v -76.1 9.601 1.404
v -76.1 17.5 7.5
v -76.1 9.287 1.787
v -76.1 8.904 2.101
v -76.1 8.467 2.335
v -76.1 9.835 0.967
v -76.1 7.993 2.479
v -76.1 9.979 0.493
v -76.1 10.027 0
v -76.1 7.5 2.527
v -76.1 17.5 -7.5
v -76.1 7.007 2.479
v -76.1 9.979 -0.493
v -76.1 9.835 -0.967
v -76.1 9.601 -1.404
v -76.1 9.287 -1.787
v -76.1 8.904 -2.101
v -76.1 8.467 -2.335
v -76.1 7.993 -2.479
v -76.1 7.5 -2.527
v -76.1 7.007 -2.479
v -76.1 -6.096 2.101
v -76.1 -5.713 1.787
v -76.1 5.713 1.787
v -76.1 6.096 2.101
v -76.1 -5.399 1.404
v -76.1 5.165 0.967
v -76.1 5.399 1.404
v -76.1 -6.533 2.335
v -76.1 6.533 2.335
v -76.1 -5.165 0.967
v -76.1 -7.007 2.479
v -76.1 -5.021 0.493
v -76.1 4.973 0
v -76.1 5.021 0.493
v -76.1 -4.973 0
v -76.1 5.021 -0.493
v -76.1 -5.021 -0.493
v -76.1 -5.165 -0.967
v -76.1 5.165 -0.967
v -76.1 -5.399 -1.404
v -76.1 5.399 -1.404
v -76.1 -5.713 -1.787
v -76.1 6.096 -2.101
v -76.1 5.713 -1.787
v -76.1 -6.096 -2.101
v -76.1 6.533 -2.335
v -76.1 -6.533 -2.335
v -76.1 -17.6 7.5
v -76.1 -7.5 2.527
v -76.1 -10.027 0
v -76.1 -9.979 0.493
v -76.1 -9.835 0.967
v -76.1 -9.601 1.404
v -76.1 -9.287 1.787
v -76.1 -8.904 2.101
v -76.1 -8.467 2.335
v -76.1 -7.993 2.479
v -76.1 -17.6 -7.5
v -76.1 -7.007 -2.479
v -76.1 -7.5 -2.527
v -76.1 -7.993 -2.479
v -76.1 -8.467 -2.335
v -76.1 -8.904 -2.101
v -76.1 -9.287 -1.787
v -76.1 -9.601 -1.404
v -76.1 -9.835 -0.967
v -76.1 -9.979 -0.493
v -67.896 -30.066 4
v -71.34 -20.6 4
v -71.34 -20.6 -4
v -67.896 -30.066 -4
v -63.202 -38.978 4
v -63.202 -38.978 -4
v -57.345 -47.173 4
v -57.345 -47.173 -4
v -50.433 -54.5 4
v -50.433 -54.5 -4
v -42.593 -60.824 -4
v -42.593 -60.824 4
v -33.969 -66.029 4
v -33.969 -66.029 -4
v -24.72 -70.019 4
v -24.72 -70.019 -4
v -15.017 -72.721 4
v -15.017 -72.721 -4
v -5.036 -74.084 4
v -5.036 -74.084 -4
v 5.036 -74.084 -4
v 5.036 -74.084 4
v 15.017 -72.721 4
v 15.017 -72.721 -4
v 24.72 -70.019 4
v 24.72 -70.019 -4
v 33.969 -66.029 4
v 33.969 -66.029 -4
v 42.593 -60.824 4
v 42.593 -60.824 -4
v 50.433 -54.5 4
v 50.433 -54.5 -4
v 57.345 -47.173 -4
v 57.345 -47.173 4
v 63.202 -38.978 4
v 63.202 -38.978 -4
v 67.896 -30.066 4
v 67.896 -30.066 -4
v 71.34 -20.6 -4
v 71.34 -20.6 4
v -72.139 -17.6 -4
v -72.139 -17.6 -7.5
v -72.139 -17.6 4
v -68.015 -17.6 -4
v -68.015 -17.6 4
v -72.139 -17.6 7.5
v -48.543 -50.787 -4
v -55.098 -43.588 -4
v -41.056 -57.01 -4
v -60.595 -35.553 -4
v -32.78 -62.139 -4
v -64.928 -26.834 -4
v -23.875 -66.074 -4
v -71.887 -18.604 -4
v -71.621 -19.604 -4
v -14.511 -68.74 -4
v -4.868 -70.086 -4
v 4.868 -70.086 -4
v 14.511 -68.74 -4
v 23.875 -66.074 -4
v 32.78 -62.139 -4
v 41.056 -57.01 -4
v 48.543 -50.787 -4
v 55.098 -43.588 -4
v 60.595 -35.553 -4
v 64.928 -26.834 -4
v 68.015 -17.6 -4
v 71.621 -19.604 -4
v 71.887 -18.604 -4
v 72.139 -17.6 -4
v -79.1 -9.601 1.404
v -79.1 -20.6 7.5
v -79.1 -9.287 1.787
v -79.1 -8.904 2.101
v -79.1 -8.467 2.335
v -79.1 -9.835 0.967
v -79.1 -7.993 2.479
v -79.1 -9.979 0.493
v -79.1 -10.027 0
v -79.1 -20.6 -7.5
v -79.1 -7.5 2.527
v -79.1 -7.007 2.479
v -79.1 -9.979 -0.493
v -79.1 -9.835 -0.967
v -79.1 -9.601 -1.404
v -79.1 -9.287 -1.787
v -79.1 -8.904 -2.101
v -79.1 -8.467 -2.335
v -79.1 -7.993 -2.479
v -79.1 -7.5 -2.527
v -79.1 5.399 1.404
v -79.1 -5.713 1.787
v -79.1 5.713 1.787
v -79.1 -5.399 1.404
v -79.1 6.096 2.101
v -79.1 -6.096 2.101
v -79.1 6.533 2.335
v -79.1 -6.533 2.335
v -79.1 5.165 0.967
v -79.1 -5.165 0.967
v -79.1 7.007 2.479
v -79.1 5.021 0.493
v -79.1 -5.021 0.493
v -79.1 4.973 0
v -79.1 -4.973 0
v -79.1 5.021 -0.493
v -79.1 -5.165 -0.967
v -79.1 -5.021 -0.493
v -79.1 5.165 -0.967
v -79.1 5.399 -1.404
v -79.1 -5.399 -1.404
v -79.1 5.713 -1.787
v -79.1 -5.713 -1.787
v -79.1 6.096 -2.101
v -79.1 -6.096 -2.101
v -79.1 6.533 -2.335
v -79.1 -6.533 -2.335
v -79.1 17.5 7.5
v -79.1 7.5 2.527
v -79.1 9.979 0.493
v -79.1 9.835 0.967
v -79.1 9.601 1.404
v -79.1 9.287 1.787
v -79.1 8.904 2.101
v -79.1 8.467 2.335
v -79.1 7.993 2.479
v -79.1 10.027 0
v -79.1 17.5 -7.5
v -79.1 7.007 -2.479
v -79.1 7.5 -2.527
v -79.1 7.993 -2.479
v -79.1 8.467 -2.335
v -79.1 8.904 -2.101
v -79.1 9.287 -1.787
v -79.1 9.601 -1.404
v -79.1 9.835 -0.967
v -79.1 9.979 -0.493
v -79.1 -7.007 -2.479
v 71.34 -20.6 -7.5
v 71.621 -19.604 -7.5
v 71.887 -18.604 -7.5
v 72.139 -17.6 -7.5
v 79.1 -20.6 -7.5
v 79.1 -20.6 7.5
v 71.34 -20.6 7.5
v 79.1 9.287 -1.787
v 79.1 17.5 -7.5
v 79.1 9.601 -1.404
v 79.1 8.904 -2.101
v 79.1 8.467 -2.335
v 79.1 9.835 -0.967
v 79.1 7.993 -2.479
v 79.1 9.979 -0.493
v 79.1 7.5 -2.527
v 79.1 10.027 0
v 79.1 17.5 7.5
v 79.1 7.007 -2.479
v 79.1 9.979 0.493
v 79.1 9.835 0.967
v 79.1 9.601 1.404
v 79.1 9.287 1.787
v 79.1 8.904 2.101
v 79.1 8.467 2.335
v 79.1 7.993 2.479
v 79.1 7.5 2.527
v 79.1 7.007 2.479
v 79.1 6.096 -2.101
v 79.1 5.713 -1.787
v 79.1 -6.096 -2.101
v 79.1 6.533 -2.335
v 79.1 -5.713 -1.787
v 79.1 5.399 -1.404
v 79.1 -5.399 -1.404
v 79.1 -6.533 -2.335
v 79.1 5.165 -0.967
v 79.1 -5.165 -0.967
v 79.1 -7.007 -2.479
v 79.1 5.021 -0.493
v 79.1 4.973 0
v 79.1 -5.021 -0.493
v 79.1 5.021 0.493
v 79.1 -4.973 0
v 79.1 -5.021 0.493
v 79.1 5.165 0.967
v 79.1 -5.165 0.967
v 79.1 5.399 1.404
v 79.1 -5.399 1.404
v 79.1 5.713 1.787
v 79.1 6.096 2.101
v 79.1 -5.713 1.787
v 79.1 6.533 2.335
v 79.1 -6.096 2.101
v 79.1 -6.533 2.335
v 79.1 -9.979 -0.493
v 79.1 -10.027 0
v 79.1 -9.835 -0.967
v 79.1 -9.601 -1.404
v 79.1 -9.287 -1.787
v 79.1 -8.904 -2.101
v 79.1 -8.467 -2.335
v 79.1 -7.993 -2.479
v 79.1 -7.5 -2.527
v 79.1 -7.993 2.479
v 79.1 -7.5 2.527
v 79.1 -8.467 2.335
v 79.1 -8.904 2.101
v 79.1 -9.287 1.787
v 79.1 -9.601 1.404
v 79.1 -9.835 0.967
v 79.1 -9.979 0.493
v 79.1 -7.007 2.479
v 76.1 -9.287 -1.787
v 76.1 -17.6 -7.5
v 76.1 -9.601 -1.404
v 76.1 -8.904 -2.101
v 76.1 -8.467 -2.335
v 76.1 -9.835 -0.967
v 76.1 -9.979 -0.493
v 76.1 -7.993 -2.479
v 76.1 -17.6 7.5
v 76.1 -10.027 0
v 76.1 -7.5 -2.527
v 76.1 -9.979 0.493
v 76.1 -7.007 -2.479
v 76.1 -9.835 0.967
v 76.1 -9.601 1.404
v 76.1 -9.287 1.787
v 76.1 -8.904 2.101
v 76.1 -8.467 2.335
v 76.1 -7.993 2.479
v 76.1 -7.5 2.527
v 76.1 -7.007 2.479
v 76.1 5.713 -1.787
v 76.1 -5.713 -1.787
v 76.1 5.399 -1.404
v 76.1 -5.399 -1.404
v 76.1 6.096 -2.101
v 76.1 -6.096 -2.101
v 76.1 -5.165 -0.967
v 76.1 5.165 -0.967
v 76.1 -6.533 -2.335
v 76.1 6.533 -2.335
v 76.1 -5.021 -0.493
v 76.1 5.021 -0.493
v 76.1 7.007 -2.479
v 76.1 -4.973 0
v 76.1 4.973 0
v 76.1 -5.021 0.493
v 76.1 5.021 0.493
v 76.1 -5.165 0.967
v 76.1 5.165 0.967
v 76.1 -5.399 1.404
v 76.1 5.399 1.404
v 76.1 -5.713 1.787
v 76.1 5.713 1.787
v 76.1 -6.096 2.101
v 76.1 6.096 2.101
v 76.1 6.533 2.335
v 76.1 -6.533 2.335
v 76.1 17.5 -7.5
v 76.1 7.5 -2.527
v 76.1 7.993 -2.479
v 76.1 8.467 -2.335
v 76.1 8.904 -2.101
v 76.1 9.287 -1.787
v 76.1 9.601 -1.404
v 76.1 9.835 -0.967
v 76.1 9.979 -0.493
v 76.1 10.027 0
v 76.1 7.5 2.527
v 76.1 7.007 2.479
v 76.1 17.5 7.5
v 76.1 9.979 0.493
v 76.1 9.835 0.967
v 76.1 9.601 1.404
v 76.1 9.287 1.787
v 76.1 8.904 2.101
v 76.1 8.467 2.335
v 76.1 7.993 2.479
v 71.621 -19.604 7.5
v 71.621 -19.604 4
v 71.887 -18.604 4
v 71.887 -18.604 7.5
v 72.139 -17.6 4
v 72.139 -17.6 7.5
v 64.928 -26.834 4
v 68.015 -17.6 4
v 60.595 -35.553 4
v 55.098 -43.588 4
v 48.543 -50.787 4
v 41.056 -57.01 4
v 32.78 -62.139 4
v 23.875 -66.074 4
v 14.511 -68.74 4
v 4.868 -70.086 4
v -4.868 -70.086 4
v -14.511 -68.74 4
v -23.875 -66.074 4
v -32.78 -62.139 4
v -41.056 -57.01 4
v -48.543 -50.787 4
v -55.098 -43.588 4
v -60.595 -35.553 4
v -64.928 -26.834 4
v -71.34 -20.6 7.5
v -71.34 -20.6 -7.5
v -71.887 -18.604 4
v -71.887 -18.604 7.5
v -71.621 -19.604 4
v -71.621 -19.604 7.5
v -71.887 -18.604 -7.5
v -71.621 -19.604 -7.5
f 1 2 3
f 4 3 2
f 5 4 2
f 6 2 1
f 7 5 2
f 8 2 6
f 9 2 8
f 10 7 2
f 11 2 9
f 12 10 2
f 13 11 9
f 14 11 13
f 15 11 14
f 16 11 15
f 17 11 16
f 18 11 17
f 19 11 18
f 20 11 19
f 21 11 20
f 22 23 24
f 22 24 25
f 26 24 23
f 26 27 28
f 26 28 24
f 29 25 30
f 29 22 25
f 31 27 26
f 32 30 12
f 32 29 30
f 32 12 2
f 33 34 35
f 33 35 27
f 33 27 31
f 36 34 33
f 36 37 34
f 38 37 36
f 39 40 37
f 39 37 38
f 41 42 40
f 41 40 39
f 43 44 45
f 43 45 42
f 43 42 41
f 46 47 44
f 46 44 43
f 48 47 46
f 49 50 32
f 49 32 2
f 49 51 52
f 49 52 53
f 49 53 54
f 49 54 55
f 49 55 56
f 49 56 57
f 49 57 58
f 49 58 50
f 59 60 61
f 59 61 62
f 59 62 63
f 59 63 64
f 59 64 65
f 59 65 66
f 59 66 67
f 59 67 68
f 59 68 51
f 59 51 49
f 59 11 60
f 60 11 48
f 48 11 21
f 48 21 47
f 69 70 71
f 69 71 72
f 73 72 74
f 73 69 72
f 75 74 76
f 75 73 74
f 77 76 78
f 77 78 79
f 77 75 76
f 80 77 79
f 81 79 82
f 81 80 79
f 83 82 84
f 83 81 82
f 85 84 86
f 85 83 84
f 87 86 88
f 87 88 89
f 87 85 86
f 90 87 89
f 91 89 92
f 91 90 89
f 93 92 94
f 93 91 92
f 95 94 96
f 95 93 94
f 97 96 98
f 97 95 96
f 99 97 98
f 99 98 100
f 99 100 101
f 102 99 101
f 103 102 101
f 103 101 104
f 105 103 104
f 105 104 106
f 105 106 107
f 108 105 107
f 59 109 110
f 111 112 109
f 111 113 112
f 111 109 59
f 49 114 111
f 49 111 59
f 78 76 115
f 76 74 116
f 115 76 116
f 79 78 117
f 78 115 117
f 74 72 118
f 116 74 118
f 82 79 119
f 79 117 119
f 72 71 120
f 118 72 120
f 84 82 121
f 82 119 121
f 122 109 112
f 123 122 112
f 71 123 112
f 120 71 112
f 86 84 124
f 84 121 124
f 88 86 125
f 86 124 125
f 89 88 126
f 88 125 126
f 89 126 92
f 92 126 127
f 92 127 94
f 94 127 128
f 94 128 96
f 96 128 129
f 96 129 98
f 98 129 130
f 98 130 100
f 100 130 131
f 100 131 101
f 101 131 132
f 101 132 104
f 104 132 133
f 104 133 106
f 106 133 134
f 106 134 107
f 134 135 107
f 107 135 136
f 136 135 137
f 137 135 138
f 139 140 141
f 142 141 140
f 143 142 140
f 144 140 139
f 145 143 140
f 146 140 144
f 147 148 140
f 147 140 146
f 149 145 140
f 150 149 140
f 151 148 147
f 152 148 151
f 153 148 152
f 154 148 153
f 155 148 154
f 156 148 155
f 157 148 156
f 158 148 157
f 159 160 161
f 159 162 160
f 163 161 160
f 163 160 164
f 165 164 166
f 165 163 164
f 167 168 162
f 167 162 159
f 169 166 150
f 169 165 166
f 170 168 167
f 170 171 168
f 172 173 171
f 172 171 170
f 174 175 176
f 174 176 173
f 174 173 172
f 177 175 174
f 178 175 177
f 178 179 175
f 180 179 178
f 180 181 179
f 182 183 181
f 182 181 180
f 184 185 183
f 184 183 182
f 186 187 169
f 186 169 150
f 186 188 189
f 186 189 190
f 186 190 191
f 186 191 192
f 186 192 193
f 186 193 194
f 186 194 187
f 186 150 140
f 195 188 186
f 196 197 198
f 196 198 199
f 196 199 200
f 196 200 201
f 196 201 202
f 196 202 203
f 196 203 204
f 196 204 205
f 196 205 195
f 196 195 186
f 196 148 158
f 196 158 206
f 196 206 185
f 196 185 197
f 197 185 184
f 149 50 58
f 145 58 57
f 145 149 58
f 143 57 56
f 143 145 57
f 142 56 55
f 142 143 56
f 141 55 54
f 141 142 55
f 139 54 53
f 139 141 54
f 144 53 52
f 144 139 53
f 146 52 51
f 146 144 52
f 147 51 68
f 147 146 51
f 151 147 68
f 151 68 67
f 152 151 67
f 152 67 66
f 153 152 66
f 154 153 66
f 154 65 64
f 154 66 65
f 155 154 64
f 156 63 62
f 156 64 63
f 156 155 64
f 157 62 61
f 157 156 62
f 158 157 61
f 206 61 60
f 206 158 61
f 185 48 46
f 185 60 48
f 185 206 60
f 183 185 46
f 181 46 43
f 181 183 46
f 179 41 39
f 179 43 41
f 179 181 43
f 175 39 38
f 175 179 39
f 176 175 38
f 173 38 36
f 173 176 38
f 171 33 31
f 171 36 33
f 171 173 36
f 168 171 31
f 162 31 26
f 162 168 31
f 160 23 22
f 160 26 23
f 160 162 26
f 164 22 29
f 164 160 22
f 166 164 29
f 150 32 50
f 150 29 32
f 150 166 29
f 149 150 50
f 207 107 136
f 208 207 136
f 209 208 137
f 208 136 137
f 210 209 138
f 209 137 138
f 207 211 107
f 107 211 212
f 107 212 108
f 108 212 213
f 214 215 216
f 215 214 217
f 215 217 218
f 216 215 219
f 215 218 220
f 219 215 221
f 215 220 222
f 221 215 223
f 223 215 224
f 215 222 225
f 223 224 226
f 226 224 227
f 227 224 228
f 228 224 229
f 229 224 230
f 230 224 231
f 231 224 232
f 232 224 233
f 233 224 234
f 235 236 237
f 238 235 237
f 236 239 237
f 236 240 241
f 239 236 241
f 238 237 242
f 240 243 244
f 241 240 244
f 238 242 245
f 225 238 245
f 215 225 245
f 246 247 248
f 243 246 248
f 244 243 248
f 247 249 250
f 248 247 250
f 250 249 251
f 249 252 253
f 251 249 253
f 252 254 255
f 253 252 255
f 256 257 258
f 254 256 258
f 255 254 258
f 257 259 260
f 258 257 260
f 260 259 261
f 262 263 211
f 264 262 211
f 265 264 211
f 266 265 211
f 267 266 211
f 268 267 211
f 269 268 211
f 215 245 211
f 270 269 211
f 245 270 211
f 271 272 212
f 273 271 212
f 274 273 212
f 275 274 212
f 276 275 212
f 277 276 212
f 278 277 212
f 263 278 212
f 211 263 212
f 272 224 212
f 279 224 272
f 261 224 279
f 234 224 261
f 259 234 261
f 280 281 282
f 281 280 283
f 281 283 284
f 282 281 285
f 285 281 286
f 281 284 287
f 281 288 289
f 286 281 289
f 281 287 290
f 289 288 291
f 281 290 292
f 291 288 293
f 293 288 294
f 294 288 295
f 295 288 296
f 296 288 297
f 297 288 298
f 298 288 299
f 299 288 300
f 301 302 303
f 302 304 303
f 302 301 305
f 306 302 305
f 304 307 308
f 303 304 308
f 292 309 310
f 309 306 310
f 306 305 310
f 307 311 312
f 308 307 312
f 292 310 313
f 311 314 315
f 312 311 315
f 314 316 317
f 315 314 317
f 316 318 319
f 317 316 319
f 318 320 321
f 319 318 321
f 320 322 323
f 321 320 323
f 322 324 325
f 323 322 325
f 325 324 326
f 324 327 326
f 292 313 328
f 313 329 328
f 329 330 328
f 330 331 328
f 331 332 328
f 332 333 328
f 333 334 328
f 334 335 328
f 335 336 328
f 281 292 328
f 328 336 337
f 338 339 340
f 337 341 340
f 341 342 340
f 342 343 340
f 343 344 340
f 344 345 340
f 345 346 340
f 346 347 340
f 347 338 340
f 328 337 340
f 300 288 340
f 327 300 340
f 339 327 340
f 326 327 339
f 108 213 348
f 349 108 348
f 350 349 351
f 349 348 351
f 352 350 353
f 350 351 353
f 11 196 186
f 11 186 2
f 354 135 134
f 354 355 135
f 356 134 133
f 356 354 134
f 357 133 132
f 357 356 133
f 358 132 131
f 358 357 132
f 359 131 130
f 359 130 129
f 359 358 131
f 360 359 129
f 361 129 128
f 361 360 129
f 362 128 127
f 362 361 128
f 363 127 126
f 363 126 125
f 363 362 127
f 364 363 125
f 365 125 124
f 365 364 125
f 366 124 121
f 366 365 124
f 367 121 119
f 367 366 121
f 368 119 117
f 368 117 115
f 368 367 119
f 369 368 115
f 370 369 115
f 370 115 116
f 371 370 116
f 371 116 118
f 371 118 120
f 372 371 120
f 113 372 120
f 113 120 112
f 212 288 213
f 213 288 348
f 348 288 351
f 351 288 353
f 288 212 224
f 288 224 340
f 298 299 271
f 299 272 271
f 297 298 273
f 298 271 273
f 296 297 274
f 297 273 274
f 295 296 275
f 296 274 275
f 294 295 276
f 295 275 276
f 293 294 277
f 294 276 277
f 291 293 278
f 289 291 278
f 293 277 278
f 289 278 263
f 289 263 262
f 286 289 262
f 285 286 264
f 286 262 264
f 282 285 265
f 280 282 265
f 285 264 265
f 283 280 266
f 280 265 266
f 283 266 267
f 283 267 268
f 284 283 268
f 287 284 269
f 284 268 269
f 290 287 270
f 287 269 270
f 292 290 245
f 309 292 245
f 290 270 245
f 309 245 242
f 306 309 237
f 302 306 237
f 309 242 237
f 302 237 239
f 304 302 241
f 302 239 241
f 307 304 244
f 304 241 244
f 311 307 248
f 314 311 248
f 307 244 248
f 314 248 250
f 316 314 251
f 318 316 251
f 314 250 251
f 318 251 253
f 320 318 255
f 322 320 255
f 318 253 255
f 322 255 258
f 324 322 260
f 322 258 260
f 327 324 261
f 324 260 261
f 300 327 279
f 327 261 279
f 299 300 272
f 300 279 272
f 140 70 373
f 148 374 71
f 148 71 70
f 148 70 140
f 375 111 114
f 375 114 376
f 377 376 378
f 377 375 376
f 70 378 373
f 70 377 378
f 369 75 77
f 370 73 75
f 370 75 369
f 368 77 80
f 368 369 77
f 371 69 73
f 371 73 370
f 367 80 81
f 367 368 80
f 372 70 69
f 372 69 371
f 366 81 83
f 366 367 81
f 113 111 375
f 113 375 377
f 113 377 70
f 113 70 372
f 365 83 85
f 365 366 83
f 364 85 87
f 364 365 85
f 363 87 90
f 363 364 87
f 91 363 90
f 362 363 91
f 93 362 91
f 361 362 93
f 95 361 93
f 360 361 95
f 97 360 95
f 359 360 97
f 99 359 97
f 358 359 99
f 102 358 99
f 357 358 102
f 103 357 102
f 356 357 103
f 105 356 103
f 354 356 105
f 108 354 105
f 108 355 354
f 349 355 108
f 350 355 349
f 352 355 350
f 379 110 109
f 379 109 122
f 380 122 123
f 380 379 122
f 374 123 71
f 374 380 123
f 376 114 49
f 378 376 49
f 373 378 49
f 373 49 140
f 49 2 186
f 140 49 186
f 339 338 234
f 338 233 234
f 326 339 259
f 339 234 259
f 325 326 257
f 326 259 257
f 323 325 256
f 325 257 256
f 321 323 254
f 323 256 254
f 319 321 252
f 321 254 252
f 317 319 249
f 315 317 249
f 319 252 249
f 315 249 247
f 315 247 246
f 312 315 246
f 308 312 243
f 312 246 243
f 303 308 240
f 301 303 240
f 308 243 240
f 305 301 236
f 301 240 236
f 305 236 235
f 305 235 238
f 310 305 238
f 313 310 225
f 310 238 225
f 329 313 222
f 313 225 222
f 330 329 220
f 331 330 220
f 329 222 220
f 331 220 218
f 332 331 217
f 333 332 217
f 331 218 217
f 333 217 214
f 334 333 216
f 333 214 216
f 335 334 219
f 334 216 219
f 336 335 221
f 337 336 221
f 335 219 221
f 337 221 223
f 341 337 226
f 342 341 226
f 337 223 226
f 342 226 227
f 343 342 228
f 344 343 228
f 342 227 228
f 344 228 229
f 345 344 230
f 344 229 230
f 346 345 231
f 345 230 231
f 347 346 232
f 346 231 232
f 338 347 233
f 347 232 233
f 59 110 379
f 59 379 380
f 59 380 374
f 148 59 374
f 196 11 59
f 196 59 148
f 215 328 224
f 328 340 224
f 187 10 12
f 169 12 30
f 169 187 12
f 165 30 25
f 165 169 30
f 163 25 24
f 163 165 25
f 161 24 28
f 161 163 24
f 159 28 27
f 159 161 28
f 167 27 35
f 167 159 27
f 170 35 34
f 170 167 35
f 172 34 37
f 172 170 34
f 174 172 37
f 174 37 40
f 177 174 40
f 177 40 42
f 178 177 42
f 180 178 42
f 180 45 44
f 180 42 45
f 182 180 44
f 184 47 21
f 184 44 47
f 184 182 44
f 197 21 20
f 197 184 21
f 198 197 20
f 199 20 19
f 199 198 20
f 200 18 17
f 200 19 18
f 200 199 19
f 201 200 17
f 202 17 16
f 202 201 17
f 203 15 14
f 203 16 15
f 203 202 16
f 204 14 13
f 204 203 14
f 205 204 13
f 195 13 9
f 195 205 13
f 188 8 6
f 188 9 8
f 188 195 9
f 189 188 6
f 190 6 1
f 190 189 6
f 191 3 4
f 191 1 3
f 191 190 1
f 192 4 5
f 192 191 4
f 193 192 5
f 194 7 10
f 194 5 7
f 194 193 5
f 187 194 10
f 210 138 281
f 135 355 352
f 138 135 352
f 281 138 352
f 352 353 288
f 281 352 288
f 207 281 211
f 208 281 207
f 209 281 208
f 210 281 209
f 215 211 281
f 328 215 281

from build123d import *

# Parameters (mm, degrees)
BOSS_EXTRUDE1_DEPTH                 = 4
BOSS_EXTRUDE2_DEPTH                 = 7.5
F_8_0_199_DIAMETER_HOLE1_AT_2_COUNT = 2
F_8_0_199_DIAMETER_HOLE1_AT_2_PITCH = 15


with BuildPart() as part:
    # Sketch1 → Boss-Extrude1 (new, symmetric)
    with BuildSketch(Plane.XY):
        with BuildLine():
            Line((-68.014741233, -17.6), (-72.139067259, -17.6))
            ThreePointArc((-72.139067259, -17.6), (-71.75538681, -19.104174642), (-71.340346404, -20.6))
            ThreePointArc((-71.340346404, -20.6), (0, -74.255), (71.340346404, -20.6))
            ThreePointArc((71.340346404, -20.6), (71.75538681, -19.104174642), (72.139067259, -17.6))
            Line((72.139067259, -17.6), (68.014741233, -17.6))
            ThreePointArc((68.014741233, -17.6), (0, -70.255), (-68.014741233, -17.6))
        make_face()
    extrude(amount=BOSS_EXTRUDE1_DEPTH, both=True)

    # Sketch1<5> → Boss-Extrude2 (add, symmetric)
    with BuildSketch(Plane.XY):
        with BuildLine():
            ThreePointArc((-71.340346404, -20.6), (-71.75538681, -19.104174642), (-72.139067259, -17.6))
            Line((-72.139067259, -17.6), (-76.1, -17.6))
            Line((-76.1, -17.6), (-76.1, 17.5))
            Line((-76.1, 17.5), (-79.1, 17.5))
            Line((-79.1, 17.5), (-79.1, -20.6))
            Line((-79.1, -20.6), (-71.340346404, -20.6))
        make_face()
        with BuildLine():
            ThreePointArc((72.139067259, -17.6), (71.75538681, -19.104174642), (71.340346404, -20.6))
            Line((71.340346404, -20.6), (79.1, -20.6))
            Line((79.1, -20.6), (79.1, 17.5))
            Line((79.1, 17.5), (76.1, 17.5))
            Line((76.1, 17.5), (76.1, -17.6))
            Line((76.1, -17.6), (72.139067259, -17.6))
        make_face()
    extrude(amount=BOSS_EXTRUDE2_DEPTH, both=True)

    # Sketch4 → #8 (0.199) Diameter Hole1 (revolve, cut)
    with BuildSketch(Plane(origin=(-79.1, 7.5, 0), x_dir=(0, 0, 1), z_dir=(0, 1, 0))):
        Polygon((0, 0), (0, 13), (2.5273, 11.481444958), (2.5273, 0), align=None)
    f_8_0_199_diameter_hole1 = revolve(axis=Axis((-85.45, 7.5, 0), (1, 0, 0)), mode=Mode.SUBTRACT)

    # #8 (0.199) Diameter Hole1 at 2: #8 (0.199) Diameter Hole1 ×2
    with Locations(*[(0, -i * F_8_0_199_DIAMETER_HOLE1_AT_2_PITCH, 0) for i in range(1, F_8_0_199_DIAMETER_HOLE1_AT_2_COUNT)]):
        add(f_8_0_199_diameter_hole1, mode=Mode.SUBTRACT)

    # Mirror1: #8 (0.199) Diameter Hole1 across plane
    add(f_8_0_199_diameter_hole1.mirror(Plane(origin=(0, 0, 0), x_dir=(0, 0, 1), z_dir=(1, 0, 0))), mode=Mode.SUBTRACT)

    # Mirror1 copy 1 sketch → Mirror1 copy 1 (revolve, cut)
    with BuildSketch(Plane(origin=(79.1, -7.5, 0), x_dir=(0, 0, 1), z_dir=(0, 1, 0))):
        Polygon((0, 0), (0, -13), (2.5273, -11.481444958), (2.5273, 0), align=None)
    revolve(axis=Axis((85.45, -7.5, 0), (1, 0, 0)), mode=Mode.SUBTRACT)


solid = part.part
